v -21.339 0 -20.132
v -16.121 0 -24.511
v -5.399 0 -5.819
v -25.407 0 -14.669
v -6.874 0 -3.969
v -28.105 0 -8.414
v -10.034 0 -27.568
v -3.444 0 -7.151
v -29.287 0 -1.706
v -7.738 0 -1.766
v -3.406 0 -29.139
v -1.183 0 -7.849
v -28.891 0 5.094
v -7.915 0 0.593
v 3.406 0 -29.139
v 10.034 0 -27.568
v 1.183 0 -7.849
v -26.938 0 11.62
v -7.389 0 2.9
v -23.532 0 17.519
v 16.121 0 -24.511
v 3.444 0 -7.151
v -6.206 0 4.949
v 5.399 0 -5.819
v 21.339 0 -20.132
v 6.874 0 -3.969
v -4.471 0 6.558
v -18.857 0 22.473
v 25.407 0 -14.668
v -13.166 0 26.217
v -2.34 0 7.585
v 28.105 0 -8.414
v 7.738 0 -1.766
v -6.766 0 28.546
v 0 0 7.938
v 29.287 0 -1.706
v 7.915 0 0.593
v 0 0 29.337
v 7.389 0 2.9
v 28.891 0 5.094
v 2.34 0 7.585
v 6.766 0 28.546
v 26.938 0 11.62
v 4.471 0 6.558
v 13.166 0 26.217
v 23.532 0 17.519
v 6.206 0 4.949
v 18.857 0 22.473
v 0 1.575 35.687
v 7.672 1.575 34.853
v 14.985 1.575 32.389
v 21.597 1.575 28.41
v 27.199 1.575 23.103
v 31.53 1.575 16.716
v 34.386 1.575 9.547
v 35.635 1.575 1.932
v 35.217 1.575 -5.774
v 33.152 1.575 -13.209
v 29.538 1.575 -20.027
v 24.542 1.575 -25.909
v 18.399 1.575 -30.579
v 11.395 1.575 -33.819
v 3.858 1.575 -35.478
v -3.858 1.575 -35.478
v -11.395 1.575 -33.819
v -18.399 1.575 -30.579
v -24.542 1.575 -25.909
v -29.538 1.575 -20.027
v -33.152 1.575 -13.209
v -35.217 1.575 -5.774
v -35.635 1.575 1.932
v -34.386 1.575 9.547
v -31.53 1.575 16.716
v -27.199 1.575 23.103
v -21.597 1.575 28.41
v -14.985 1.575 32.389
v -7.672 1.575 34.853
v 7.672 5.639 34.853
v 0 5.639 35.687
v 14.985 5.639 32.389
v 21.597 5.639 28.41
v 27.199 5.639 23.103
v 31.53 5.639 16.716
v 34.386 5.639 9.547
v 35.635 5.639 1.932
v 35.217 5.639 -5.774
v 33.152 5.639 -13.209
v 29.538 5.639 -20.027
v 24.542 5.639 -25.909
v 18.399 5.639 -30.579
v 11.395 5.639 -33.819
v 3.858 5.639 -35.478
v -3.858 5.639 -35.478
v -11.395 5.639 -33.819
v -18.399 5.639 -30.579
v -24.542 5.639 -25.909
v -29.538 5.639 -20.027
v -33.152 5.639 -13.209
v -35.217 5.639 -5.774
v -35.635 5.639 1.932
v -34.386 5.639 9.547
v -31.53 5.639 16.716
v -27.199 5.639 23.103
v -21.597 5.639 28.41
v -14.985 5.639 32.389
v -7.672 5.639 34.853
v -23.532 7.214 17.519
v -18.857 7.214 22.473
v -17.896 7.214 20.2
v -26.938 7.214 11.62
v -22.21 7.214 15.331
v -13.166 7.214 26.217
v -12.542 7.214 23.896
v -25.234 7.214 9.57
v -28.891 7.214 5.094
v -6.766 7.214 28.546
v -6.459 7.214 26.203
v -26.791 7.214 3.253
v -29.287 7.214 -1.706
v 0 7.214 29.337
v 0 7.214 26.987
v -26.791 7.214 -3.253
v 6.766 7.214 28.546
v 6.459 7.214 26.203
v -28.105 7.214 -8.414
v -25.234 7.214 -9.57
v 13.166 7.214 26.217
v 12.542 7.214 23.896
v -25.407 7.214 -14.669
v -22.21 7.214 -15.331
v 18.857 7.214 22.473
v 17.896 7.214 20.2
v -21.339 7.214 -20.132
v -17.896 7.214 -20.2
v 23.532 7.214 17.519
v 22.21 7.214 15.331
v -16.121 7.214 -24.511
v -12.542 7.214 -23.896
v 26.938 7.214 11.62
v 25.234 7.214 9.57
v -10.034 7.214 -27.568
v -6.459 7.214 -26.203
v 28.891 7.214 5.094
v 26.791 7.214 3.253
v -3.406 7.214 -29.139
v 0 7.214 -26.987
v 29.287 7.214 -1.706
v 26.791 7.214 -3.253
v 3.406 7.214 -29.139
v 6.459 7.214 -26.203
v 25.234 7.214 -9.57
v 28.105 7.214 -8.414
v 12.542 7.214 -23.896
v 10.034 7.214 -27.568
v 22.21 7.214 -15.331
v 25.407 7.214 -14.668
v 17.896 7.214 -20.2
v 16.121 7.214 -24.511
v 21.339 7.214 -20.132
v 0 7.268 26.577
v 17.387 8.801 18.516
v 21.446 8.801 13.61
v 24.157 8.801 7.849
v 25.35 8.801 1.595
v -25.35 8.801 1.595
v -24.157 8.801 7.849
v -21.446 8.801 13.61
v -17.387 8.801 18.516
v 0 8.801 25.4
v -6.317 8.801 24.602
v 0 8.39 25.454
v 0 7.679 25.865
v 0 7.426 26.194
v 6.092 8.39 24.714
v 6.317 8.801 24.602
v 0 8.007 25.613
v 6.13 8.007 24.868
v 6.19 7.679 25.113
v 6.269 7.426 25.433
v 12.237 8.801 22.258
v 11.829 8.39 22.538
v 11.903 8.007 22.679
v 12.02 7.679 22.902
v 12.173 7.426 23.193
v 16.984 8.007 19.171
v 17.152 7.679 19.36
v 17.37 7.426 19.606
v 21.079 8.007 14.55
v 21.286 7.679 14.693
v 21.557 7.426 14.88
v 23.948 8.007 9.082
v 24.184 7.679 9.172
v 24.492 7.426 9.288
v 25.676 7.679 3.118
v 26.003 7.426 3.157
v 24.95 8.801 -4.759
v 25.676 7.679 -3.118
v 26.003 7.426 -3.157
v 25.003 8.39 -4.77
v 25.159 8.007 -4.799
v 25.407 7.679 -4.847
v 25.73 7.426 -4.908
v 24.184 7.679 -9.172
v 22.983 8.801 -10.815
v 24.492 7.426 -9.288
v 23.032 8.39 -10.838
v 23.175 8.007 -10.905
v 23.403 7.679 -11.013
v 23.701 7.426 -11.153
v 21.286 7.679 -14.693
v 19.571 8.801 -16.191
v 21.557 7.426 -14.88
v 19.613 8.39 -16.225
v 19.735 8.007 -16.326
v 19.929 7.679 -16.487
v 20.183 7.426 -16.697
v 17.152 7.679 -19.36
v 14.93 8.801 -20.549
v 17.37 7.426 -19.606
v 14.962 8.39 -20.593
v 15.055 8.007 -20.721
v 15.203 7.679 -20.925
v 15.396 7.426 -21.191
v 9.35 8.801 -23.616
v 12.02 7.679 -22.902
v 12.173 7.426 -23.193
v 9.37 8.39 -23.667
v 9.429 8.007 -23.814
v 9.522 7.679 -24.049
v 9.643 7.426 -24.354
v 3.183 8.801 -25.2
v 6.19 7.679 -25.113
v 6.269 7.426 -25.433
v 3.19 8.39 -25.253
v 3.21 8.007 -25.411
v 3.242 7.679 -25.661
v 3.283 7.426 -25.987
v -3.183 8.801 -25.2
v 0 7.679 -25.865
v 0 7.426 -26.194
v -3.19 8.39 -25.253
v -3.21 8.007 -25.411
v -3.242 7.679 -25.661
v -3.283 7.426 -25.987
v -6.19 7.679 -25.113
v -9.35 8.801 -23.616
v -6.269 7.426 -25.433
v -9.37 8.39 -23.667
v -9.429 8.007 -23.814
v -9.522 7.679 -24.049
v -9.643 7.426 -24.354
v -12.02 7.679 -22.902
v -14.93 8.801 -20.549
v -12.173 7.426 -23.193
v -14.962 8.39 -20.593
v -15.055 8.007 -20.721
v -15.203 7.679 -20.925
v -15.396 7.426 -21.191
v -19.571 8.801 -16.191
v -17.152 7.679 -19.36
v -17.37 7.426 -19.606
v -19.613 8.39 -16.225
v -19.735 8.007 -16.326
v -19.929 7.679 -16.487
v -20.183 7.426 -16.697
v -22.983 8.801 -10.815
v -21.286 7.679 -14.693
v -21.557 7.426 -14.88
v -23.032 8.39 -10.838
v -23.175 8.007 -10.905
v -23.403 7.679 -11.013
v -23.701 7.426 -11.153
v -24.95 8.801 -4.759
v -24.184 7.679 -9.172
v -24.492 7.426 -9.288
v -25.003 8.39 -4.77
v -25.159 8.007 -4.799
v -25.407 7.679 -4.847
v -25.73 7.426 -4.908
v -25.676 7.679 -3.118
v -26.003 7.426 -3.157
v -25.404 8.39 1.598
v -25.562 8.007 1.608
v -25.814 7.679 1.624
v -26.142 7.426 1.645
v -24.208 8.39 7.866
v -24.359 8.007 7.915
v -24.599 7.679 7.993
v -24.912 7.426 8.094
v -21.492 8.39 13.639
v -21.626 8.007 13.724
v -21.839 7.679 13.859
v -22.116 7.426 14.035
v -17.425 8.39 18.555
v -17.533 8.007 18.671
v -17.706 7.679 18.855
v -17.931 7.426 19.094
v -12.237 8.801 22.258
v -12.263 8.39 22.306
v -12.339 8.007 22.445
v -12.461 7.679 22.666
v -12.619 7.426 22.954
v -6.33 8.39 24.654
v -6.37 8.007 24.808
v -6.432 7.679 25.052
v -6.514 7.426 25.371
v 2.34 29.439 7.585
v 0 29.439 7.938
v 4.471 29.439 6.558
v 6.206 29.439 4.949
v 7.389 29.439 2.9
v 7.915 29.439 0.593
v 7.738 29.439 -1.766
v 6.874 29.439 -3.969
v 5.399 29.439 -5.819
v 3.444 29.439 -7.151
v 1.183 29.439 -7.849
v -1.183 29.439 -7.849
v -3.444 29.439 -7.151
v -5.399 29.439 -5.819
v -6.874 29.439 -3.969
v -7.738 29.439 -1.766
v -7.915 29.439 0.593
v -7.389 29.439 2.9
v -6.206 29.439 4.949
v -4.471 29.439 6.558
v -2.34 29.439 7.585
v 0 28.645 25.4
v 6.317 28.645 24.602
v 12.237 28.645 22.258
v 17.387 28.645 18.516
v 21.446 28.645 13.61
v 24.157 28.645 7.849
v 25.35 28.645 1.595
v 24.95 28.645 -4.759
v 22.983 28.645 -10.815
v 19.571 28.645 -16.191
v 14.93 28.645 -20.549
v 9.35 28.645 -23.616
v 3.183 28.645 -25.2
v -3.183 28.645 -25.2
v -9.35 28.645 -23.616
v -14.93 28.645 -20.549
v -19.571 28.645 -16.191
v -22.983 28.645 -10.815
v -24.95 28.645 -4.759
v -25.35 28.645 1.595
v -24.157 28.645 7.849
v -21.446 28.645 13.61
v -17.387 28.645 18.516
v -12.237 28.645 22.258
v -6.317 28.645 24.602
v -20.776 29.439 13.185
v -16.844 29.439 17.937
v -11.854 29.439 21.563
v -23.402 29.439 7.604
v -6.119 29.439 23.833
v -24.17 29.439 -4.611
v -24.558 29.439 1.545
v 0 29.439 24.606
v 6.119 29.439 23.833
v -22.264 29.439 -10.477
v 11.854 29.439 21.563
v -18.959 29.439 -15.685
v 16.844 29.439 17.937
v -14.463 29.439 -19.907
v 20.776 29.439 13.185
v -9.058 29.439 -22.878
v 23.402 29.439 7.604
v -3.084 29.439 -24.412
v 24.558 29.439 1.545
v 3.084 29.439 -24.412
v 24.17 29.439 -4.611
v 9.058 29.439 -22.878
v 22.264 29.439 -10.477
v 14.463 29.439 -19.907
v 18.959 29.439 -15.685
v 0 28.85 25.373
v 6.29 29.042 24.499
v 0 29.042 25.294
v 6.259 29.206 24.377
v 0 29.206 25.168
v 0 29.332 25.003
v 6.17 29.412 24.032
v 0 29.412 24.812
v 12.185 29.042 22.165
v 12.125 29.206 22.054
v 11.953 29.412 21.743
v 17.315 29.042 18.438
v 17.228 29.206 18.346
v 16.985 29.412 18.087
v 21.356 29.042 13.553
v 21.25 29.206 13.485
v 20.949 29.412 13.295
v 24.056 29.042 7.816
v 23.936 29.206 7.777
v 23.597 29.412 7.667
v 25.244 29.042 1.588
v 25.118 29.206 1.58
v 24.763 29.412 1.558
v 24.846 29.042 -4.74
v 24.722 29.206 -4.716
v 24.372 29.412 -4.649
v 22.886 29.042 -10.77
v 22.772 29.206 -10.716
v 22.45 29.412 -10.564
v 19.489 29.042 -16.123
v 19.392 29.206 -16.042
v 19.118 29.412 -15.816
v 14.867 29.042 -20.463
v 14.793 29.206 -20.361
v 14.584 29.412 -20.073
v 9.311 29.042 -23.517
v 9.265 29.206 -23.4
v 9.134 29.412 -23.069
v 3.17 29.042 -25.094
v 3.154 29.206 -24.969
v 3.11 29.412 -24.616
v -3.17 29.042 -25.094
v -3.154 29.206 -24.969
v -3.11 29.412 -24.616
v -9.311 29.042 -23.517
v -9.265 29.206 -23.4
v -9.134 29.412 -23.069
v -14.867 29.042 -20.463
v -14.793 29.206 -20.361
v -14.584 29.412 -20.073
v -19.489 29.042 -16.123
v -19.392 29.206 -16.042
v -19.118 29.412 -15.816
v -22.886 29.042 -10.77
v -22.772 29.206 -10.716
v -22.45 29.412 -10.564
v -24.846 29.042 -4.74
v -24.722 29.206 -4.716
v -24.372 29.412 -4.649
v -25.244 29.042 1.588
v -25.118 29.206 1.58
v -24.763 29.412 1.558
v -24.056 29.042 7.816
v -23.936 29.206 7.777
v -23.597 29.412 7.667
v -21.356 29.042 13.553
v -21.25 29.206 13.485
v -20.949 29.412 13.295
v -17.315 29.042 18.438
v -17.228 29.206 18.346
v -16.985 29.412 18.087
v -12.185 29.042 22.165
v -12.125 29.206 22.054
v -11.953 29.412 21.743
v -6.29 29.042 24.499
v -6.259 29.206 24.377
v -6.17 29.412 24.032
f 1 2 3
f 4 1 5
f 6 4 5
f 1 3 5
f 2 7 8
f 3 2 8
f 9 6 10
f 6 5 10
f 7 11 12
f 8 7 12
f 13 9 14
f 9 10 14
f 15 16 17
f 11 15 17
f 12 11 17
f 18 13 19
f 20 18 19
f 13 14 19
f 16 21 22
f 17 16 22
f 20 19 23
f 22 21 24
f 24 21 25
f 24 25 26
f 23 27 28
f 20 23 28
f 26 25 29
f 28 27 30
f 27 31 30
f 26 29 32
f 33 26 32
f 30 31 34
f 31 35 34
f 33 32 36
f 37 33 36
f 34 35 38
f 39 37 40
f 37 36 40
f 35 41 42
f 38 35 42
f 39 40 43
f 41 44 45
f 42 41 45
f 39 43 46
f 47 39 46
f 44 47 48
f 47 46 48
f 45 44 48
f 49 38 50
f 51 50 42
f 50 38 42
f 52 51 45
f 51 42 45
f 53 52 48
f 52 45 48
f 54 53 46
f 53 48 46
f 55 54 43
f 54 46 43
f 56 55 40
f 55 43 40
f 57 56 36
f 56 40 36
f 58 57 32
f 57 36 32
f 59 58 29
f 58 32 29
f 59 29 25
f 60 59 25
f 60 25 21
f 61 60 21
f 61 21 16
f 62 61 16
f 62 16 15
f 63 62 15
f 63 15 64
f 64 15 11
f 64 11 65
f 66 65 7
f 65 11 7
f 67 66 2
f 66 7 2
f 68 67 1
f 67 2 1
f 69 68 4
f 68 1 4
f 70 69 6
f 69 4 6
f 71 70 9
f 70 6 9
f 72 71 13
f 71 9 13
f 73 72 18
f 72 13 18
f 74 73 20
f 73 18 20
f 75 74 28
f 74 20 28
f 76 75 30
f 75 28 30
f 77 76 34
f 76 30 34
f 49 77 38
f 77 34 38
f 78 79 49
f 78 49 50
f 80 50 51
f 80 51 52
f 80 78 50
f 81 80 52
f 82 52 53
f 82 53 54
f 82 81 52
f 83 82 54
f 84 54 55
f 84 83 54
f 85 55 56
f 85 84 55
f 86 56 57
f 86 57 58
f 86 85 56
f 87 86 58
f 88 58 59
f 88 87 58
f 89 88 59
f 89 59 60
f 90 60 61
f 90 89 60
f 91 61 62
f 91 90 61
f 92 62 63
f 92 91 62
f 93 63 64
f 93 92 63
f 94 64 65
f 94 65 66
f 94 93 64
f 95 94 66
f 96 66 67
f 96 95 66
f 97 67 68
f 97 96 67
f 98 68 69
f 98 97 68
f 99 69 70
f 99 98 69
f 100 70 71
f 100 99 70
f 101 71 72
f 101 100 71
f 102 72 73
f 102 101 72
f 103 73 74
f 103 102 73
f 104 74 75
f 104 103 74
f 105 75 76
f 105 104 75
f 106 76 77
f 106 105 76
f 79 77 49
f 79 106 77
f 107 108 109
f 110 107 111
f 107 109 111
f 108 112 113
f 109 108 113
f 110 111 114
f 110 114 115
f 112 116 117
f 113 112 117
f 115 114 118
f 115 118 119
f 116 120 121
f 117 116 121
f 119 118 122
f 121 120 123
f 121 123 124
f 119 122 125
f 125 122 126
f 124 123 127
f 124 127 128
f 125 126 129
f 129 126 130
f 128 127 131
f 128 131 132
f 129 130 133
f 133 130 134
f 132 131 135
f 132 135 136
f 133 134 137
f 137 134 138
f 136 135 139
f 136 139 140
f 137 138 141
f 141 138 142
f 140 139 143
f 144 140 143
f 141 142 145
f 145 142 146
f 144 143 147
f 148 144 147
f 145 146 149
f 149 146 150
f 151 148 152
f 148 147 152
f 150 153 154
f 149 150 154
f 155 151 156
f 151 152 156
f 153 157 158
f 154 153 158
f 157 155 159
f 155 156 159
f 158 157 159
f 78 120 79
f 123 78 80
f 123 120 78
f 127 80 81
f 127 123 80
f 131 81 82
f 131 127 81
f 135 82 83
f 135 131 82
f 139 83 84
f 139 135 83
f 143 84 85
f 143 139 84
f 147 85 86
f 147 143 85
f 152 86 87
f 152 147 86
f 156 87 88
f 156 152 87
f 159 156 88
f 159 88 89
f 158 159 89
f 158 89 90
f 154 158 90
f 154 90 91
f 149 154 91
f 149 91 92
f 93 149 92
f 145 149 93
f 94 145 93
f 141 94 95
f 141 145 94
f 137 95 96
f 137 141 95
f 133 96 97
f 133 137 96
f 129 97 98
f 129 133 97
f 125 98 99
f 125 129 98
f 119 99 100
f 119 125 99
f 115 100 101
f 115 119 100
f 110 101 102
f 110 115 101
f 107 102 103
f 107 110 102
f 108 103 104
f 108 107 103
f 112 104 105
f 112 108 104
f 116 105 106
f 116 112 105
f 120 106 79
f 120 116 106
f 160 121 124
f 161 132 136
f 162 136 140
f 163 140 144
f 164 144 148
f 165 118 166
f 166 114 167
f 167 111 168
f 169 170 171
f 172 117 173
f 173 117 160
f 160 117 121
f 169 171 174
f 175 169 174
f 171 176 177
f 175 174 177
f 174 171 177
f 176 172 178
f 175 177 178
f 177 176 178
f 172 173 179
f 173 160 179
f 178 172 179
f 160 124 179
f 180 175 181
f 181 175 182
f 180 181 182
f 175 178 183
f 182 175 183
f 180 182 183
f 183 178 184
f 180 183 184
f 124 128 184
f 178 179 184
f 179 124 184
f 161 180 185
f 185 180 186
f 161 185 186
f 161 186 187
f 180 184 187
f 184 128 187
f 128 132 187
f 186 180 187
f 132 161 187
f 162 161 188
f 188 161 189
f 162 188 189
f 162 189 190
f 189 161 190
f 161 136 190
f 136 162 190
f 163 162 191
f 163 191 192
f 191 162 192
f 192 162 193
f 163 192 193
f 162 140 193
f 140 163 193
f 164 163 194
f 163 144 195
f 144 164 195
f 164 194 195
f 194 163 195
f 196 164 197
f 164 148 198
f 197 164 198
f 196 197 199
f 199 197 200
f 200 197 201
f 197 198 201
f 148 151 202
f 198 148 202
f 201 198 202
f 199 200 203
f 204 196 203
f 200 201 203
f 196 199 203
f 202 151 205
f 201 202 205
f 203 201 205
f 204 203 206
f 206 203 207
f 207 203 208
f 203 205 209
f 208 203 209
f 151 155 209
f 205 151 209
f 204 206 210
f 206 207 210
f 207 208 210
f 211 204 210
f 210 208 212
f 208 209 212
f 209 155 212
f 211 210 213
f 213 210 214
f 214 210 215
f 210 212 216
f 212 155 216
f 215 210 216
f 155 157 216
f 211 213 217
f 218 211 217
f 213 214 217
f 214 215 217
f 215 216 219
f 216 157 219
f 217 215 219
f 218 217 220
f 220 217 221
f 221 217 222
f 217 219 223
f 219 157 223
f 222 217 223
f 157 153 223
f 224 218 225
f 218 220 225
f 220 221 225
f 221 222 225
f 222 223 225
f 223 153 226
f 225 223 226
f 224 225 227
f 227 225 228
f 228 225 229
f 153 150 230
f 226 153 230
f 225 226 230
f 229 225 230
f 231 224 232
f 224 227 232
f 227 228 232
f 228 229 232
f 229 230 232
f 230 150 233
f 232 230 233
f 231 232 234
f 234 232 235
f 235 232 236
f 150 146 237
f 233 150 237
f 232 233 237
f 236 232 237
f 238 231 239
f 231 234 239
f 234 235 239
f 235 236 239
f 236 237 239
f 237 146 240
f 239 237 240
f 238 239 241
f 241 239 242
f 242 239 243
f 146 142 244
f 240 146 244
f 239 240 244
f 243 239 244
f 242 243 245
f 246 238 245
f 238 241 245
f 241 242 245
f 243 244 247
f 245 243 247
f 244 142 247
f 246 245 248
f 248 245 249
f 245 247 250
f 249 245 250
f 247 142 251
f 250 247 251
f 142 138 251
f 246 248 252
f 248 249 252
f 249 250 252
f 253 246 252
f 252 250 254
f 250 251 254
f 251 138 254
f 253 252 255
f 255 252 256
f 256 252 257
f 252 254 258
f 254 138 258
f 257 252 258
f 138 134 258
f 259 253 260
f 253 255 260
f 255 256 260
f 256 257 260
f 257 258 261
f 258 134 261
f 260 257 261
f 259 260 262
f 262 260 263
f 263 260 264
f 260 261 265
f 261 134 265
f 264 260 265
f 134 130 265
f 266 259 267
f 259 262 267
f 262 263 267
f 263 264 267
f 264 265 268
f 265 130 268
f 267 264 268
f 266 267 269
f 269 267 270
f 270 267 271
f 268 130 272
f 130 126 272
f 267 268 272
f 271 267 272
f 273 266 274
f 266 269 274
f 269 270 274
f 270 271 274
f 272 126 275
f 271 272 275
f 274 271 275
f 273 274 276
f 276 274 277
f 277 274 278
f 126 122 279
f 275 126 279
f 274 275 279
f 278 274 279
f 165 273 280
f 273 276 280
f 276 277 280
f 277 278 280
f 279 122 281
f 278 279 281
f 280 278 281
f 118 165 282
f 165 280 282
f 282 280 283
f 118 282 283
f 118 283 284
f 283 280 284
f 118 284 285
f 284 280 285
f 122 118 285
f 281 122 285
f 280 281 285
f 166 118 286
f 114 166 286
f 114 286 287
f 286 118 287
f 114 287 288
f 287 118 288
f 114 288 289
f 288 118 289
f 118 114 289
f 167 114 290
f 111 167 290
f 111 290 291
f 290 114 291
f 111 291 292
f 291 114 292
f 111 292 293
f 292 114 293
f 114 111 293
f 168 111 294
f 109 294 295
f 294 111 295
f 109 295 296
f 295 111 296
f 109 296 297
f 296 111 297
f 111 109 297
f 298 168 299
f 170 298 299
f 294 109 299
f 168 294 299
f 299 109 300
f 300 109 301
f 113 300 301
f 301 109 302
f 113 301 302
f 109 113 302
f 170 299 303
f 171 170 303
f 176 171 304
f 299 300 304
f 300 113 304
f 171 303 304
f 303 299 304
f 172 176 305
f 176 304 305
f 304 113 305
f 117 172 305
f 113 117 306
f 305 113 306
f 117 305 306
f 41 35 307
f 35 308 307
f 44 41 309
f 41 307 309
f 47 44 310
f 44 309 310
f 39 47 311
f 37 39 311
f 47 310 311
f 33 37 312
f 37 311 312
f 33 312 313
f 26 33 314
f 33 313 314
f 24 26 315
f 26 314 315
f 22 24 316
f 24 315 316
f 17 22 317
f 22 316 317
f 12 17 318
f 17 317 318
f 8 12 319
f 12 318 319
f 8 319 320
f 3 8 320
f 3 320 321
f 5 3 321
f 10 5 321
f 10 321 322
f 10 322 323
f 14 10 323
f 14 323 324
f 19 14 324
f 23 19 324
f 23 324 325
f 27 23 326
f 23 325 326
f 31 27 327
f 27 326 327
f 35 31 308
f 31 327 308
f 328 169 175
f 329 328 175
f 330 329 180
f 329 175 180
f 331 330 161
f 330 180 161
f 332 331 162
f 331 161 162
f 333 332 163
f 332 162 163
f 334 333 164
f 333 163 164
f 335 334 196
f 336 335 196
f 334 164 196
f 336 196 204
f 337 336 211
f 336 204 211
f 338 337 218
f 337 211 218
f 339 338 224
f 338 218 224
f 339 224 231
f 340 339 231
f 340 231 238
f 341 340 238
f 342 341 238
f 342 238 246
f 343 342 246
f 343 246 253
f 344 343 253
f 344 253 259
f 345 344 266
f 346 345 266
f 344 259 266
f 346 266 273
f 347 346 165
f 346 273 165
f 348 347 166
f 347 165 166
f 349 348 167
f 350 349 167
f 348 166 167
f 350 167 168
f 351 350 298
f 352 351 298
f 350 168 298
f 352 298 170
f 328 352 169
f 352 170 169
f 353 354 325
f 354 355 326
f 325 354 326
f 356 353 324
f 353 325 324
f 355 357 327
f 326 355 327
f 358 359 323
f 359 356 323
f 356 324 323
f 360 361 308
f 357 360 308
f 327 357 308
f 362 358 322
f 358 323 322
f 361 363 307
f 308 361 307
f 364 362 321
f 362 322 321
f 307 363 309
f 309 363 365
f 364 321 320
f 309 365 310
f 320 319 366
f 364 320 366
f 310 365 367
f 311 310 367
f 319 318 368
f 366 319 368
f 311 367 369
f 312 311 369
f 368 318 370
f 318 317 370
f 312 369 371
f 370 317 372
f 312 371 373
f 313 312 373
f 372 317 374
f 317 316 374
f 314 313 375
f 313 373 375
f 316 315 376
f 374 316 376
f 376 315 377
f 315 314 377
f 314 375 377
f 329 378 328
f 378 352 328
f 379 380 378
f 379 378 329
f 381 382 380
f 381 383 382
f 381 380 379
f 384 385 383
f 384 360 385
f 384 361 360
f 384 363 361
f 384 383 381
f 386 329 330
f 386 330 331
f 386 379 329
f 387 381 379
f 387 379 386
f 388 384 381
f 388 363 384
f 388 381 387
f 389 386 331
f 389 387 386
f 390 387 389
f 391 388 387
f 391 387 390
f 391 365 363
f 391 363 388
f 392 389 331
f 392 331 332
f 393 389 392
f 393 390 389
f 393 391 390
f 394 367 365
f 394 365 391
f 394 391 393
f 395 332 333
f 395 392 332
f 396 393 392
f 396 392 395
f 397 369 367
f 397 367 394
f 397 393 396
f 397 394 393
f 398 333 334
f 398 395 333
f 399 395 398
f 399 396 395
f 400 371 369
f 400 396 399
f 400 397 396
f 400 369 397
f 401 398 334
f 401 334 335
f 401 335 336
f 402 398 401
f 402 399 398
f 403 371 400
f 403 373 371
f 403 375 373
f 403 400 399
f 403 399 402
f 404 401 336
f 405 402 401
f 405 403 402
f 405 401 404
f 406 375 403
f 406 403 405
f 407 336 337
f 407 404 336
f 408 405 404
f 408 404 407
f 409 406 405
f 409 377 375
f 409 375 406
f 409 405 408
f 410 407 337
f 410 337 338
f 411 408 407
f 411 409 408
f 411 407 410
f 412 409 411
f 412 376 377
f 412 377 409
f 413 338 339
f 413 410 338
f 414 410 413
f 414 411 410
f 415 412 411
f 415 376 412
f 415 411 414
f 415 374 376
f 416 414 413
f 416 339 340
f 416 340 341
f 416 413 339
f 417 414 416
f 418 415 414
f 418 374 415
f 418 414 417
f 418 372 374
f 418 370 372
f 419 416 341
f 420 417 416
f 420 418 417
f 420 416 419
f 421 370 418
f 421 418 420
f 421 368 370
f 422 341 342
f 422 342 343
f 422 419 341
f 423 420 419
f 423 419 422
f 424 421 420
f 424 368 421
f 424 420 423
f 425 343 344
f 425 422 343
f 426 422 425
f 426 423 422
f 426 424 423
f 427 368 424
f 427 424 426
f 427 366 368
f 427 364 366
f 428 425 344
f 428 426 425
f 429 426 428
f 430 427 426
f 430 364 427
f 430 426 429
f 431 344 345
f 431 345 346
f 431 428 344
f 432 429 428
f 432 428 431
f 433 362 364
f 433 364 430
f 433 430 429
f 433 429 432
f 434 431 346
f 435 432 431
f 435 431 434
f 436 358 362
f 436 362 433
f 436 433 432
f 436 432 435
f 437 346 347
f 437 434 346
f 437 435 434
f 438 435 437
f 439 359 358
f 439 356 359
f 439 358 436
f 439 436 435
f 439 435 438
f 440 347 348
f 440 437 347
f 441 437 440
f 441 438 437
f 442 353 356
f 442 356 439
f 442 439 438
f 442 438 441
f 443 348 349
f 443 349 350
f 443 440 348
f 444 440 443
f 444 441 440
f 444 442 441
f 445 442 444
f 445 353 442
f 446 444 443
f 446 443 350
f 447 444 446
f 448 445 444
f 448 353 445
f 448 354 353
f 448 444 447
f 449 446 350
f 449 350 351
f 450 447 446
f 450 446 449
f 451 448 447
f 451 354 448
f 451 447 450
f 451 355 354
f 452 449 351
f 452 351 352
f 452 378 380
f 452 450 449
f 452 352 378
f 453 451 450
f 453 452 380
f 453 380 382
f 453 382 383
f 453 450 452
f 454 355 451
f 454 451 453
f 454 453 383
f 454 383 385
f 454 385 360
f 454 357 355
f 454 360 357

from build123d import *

# Parameters (mm, degrees)
F0_W     = 7.2136
F0_H     = 10.287
F0_H_2   = 17.2237775958
F2_R     = 1.5875
F3_R     = 0.79375
F4_SIZE2 = 6.35
F4_SIZE  = 1.5748


with BuildPart() as f1:
    # F0 (on Right) → F1 (revolve)
    with BuildSketch(Plane.YZ):
        with Locations((3.6068, 30.5435)):
            Rectangle(F0_W, F0_H)
        with Locations((3.6068, 16.7881112021)):
            Rectangle(F0_W, F0_H_2)
        Polygon((7.2136, 8.1762224042), (0, 8.1762224042), (0, 7.9375), (29.4386, 7.9375), (29.4386, 25.4), (7.2136, 25.4), align=None)
    revolve(axis=Axis((0, 15.9048408099, 0), (0, 1, 0)))

    # F2
    f2_edges = [f1.edges().sort_by_distance(p)[0] for p in [
        (0, 7.2136, -25.4),
    ]]
    fillet(f2_edges, radius=F2_R)

    # F3
    f3_edges = [f1.edges().sort_by_distance(p)[0] for p in [
        (0, 29.4386, -25.4),
    ]]
    fillet(f3_edges, radius=F3_R)

    # F4
    f4_edges = [f1.edges().sort_by_distance(p)[0] for p in [
        (0, 0, -35.687),
        (0, 7.2136, -35.687),
    ]]
    f4_side = f1.faces().sort_by_distance((0, 3.6068, -35.687))[0]
    chamfer(f4_edges, length=F4_SIZE, length2=F4_SIZE2, reference=f4_side)


solid = f1.part
